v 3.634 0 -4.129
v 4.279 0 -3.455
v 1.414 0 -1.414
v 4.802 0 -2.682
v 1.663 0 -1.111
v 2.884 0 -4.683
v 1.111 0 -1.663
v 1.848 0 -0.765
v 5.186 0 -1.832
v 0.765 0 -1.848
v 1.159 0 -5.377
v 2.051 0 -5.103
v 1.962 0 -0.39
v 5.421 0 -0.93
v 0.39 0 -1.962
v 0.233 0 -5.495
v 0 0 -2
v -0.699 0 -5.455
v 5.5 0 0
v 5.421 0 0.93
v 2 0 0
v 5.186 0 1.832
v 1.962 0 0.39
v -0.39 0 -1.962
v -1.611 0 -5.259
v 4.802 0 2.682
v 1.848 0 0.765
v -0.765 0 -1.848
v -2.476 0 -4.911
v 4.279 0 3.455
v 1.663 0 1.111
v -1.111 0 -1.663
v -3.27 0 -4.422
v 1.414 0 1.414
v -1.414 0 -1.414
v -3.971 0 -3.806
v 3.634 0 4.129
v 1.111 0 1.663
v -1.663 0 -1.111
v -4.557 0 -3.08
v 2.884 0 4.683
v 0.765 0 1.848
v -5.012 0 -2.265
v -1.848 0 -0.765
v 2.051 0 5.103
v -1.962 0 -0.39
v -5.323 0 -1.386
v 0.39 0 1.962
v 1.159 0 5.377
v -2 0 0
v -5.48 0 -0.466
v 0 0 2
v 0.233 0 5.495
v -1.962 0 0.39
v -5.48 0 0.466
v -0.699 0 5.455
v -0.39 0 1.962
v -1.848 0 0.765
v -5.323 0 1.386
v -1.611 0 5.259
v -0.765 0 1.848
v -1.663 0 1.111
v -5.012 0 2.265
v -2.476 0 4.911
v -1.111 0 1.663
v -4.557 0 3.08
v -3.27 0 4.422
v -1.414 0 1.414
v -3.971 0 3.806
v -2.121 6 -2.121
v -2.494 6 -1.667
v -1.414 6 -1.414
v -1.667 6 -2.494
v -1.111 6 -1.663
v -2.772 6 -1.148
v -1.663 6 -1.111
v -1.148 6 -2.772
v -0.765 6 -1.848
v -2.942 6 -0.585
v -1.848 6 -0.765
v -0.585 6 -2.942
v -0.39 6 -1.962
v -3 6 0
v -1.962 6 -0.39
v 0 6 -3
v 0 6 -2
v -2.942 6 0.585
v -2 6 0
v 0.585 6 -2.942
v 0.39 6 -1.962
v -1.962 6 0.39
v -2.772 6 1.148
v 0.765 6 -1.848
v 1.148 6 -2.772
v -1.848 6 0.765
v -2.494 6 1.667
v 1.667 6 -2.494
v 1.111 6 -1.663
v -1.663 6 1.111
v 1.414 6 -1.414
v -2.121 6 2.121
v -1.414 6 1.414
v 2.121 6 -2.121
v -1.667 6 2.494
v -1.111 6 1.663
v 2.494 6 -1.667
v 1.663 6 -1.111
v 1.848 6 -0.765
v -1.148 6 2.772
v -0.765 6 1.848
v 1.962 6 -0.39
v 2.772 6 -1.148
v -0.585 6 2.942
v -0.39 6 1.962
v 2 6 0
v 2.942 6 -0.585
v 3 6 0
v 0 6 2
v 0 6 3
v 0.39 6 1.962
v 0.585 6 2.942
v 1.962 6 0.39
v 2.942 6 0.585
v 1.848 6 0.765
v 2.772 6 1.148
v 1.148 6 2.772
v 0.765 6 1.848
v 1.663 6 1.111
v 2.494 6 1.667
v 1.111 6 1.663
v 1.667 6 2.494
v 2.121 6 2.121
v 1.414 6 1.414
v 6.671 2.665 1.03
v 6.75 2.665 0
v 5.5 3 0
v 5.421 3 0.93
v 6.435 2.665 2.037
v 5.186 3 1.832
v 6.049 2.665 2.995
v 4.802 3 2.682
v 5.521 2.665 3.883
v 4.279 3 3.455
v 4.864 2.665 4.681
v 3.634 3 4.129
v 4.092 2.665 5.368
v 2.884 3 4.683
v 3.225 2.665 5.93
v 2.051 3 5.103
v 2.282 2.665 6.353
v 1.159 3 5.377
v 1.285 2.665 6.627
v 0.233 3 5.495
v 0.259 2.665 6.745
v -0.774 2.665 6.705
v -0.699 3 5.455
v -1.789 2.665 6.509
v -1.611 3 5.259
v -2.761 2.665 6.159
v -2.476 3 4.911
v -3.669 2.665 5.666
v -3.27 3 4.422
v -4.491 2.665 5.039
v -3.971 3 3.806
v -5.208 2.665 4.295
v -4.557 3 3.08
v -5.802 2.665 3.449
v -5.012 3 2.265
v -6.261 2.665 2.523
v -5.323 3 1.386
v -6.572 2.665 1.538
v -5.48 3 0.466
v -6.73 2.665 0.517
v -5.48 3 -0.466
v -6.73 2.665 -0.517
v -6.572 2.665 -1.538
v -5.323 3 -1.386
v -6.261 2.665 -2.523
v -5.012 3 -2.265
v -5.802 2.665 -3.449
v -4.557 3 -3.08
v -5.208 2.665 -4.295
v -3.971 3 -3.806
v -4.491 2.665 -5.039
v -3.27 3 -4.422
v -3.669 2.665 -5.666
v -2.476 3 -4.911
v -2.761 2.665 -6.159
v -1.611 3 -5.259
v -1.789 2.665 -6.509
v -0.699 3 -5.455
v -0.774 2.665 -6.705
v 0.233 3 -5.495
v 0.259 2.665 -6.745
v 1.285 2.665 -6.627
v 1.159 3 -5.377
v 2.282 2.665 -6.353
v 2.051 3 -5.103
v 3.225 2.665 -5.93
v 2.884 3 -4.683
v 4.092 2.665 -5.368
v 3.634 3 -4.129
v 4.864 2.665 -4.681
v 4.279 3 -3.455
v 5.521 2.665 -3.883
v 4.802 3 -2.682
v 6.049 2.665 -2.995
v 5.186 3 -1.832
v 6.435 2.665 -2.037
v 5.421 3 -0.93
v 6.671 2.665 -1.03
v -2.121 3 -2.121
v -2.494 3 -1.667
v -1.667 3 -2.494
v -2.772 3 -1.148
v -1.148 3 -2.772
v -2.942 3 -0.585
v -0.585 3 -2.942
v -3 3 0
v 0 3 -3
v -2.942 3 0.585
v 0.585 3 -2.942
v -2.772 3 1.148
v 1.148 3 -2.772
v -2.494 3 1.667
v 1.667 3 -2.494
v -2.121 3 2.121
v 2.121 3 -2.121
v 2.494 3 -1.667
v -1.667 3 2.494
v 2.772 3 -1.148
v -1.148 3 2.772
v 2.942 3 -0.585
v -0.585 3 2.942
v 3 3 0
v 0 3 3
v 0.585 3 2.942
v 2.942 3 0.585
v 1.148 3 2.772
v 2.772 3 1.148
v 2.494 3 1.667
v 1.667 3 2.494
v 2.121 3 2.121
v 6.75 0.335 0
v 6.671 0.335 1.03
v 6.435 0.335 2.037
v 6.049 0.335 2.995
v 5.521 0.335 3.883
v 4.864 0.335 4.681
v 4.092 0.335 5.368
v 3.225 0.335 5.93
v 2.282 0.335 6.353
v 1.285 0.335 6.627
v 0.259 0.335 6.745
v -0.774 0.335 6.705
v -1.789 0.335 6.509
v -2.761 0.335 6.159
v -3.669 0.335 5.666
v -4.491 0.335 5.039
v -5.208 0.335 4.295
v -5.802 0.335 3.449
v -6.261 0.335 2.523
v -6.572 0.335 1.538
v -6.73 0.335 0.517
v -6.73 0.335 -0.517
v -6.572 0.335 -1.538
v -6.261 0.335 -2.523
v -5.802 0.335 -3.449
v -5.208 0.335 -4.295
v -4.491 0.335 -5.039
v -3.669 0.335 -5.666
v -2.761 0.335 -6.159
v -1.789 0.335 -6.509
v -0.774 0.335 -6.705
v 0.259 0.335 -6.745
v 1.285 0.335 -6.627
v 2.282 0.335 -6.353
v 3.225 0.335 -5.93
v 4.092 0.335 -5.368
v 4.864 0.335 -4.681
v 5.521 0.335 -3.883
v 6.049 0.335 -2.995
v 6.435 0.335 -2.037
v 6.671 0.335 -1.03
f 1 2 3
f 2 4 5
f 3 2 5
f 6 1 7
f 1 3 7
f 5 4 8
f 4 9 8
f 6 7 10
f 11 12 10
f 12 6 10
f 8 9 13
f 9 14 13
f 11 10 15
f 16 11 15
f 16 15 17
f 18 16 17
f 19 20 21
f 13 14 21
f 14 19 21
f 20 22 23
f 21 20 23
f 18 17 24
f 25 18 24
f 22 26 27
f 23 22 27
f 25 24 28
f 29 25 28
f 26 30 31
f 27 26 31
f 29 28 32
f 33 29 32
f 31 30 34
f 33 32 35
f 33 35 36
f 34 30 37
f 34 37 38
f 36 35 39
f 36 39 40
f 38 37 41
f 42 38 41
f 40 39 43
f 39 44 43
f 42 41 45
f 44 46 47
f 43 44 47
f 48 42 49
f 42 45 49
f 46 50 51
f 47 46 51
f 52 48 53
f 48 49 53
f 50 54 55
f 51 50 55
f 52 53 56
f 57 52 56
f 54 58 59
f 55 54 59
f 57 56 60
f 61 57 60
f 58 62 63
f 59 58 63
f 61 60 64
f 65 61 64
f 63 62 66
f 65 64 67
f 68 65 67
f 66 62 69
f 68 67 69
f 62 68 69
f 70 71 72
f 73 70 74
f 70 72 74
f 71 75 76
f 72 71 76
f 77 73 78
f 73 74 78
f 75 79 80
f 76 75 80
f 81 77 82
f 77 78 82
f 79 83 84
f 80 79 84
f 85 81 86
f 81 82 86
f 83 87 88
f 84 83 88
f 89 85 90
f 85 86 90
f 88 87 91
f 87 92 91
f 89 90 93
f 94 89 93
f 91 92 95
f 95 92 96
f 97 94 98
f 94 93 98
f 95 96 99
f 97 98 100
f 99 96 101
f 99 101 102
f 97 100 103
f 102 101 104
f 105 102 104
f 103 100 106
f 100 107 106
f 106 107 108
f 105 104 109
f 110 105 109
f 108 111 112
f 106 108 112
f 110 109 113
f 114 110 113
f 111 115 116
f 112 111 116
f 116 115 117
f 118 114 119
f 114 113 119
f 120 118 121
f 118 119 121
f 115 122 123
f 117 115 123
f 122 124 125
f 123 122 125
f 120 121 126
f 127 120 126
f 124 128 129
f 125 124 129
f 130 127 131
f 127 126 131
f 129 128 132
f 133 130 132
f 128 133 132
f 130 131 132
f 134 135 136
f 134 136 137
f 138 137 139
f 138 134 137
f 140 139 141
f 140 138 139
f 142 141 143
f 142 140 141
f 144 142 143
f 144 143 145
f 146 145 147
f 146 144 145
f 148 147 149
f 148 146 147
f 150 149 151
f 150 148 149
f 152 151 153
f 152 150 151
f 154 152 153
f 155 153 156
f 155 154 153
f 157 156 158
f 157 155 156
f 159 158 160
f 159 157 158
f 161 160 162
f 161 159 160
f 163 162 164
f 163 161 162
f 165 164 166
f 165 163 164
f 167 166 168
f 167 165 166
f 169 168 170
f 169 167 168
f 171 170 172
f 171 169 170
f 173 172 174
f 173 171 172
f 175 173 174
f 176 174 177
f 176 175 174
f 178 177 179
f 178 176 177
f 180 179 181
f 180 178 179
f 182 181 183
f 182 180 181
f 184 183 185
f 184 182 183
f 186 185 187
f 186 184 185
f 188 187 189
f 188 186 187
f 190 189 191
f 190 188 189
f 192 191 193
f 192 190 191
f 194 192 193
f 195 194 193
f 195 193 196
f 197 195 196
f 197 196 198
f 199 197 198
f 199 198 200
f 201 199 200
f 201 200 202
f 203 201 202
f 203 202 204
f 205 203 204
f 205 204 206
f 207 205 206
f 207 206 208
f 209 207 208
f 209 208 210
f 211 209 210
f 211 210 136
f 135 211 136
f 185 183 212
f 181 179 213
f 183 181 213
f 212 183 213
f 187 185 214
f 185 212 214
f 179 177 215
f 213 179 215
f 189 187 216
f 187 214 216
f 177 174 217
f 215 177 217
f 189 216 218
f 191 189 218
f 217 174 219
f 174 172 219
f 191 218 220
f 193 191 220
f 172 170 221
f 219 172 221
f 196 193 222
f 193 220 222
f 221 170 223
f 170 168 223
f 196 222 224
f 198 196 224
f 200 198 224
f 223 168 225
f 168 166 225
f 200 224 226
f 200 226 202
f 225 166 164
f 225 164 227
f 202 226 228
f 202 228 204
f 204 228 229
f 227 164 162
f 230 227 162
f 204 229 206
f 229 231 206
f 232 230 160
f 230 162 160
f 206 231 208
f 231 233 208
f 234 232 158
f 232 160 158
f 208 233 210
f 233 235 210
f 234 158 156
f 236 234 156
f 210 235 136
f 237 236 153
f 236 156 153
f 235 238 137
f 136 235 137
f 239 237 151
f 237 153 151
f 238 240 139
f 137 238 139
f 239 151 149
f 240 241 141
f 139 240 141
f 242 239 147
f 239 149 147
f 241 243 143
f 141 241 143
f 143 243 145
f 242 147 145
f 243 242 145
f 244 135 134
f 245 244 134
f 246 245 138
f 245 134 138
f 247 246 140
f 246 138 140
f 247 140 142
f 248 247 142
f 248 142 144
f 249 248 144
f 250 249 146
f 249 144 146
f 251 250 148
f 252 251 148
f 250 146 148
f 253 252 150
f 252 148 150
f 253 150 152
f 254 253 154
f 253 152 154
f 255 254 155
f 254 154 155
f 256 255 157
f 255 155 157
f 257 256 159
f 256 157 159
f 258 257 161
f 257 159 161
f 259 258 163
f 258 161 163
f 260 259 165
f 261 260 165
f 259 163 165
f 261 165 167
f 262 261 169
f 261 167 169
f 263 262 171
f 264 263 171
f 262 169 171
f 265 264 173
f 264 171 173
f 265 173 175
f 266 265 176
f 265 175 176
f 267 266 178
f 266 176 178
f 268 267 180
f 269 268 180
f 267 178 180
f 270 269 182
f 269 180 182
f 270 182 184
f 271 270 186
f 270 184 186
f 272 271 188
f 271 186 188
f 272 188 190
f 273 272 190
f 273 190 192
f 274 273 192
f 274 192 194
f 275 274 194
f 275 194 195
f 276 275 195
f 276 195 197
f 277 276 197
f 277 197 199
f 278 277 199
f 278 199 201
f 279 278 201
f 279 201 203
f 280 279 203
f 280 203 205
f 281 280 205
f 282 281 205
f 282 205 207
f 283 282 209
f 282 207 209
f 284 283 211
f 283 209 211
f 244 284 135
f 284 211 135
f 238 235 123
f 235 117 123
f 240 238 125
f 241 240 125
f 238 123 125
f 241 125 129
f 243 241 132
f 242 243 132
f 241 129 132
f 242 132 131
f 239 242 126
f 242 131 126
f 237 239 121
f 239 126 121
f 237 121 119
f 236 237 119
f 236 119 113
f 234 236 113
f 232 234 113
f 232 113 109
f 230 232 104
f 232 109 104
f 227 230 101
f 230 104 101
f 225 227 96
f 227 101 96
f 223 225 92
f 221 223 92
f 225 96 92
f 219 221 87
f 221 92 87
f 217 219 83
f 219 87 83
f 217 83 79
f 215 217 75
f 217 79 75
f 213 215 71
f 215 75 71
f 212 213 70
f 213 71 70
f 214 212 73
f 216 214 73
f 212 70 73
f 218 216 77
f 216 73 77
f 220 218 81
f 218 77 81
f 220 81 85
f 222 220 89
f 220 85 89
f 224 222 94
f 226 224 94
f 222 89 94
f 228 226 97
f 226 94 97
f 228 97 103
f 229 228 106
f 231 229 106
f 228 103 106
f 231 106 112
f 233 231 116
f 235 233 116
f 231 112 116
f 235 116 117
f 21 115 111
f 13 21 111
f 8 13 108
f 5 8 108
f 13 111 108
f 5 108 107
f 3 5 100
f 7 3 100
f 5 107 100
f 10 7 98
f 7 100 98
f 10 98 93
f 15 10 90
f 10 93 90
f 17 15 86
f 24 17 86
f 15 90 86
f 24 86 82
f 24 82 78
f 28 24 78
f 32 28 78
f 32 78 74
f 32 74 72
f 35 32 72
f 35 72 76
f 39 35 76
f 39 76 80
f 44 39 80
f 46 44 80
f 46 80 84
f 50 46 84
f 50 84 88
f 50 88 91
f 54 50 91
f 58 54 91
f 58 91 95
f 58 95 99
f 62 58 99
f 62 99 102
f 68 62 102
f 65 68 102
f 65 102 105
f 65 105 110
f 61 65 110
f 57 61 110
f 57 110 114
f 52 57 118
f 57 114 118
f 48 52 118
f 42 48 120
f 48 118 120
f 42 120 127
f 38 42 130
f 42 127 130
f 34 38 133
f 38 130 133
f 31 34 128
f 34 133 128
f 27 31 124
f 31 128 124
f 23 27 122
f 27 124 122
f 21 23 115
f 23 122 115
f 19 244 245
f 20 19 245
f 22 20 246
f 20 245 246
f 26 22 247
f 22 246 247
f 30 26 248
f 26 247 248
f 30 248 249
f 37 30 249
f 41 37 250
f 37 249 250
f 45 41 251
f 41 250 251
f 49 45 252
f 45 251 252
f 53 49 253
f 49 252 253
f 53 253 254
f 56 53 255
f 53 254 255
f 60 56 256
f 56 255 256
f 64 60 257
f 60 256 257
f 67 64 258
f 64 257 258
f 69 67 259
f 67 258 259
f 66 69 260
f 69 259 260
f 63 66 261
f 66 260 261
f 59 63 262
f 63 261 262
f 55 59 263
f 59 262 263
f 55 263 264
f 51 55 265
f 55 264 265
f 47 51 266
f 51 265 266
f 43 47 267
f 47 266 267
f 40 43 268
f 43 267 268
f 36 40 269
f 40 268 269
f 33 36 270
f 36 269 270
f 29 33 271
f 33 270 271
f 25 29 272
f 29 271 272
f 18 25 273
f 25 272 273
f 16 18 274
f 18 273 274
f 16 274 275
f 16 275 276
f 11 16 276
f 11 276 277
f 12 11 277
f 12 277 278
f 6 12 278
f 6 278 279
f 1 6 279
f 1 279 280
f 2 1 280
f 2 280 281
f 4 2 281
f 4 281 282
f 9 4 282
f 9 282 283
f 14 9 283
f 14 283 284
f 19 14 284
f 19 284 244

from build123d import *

# Parameters (mm, degrees)
CHAMFER_2_SIZE           = 1.25
CHAMFER_2_SIZE2          = 0.334936491
CHAMFER_3_SIZE           = 1.25
CHAMFER_3_SIZE2          = 0.334936491
SKETCH_4_R               = 2
CUT_EXTRUDE_2_DEPTH      = 1
CUT_EXTRUDE_2_DEPTH_BACK = 7


with BuildPart() as part:
    # Эскиз2 → Повернуть2 (revolve)
    with BuildSketch(Plane.XY):
        Polygon((0, 0), (6.75, 0), (6.75, 3), (3, 3), (3, 6), (0, 6), align=None)
    revolve(axis=Axis((0, 6, 0), (0, -1, 0)))

    # Фаска2
    chamfer_2_edges = [part.edges().sort_by_distance(p)[0] for p in [
        (-6.75, 3, 0),
    ]]
    chamfer_2_side = [part.faces().sort_by_distance(p)[0] for p in [
        (-6.559081169, 3, 0),
    ]]
    chamfer(chamfer_2_edges, length=CHAMFER_2_SIZE, length2=CHAMFER_2_SIZE2, reference=chamfer_2_side[0])

    # Фаска3
    chamfer_3_edges = [part.edges().sort_by_distance(p)[0] for p in [
        (-6.75, 0, 0),
    ]]
    chamfer_3_side = [part.faces().sort_by_distance(p)[0] for p in [
        (0, 0, 0),
    ]]
    chamfer(chamfer_3_edges, length=CHAMFER_3_SIZE, length2=CHAMFER_3_SIZE2, reference=chamfer_3_side[0])

    # Эскиз4 → Вырез-Вытянуть2 (cut, two sides)
    with BuildSketch(Plane(origin=(0, 6, 0), x_dir=(1, 0, 0), z_dir=(0, 1, 0))) as cut_extrude_2_sk:
        Circle(SKETCH_4_R)
    extrude(amount=CUT_EXTRUDE_2_DEPTH, mode=Mode.SUBTRACT)
    extrude(cut_extrude_2_sk.sketch, amount=-CUT_EXTRUDE_2_DEPTH_BACK, mode=Mode.SUBTRACT)


solid = part.part
